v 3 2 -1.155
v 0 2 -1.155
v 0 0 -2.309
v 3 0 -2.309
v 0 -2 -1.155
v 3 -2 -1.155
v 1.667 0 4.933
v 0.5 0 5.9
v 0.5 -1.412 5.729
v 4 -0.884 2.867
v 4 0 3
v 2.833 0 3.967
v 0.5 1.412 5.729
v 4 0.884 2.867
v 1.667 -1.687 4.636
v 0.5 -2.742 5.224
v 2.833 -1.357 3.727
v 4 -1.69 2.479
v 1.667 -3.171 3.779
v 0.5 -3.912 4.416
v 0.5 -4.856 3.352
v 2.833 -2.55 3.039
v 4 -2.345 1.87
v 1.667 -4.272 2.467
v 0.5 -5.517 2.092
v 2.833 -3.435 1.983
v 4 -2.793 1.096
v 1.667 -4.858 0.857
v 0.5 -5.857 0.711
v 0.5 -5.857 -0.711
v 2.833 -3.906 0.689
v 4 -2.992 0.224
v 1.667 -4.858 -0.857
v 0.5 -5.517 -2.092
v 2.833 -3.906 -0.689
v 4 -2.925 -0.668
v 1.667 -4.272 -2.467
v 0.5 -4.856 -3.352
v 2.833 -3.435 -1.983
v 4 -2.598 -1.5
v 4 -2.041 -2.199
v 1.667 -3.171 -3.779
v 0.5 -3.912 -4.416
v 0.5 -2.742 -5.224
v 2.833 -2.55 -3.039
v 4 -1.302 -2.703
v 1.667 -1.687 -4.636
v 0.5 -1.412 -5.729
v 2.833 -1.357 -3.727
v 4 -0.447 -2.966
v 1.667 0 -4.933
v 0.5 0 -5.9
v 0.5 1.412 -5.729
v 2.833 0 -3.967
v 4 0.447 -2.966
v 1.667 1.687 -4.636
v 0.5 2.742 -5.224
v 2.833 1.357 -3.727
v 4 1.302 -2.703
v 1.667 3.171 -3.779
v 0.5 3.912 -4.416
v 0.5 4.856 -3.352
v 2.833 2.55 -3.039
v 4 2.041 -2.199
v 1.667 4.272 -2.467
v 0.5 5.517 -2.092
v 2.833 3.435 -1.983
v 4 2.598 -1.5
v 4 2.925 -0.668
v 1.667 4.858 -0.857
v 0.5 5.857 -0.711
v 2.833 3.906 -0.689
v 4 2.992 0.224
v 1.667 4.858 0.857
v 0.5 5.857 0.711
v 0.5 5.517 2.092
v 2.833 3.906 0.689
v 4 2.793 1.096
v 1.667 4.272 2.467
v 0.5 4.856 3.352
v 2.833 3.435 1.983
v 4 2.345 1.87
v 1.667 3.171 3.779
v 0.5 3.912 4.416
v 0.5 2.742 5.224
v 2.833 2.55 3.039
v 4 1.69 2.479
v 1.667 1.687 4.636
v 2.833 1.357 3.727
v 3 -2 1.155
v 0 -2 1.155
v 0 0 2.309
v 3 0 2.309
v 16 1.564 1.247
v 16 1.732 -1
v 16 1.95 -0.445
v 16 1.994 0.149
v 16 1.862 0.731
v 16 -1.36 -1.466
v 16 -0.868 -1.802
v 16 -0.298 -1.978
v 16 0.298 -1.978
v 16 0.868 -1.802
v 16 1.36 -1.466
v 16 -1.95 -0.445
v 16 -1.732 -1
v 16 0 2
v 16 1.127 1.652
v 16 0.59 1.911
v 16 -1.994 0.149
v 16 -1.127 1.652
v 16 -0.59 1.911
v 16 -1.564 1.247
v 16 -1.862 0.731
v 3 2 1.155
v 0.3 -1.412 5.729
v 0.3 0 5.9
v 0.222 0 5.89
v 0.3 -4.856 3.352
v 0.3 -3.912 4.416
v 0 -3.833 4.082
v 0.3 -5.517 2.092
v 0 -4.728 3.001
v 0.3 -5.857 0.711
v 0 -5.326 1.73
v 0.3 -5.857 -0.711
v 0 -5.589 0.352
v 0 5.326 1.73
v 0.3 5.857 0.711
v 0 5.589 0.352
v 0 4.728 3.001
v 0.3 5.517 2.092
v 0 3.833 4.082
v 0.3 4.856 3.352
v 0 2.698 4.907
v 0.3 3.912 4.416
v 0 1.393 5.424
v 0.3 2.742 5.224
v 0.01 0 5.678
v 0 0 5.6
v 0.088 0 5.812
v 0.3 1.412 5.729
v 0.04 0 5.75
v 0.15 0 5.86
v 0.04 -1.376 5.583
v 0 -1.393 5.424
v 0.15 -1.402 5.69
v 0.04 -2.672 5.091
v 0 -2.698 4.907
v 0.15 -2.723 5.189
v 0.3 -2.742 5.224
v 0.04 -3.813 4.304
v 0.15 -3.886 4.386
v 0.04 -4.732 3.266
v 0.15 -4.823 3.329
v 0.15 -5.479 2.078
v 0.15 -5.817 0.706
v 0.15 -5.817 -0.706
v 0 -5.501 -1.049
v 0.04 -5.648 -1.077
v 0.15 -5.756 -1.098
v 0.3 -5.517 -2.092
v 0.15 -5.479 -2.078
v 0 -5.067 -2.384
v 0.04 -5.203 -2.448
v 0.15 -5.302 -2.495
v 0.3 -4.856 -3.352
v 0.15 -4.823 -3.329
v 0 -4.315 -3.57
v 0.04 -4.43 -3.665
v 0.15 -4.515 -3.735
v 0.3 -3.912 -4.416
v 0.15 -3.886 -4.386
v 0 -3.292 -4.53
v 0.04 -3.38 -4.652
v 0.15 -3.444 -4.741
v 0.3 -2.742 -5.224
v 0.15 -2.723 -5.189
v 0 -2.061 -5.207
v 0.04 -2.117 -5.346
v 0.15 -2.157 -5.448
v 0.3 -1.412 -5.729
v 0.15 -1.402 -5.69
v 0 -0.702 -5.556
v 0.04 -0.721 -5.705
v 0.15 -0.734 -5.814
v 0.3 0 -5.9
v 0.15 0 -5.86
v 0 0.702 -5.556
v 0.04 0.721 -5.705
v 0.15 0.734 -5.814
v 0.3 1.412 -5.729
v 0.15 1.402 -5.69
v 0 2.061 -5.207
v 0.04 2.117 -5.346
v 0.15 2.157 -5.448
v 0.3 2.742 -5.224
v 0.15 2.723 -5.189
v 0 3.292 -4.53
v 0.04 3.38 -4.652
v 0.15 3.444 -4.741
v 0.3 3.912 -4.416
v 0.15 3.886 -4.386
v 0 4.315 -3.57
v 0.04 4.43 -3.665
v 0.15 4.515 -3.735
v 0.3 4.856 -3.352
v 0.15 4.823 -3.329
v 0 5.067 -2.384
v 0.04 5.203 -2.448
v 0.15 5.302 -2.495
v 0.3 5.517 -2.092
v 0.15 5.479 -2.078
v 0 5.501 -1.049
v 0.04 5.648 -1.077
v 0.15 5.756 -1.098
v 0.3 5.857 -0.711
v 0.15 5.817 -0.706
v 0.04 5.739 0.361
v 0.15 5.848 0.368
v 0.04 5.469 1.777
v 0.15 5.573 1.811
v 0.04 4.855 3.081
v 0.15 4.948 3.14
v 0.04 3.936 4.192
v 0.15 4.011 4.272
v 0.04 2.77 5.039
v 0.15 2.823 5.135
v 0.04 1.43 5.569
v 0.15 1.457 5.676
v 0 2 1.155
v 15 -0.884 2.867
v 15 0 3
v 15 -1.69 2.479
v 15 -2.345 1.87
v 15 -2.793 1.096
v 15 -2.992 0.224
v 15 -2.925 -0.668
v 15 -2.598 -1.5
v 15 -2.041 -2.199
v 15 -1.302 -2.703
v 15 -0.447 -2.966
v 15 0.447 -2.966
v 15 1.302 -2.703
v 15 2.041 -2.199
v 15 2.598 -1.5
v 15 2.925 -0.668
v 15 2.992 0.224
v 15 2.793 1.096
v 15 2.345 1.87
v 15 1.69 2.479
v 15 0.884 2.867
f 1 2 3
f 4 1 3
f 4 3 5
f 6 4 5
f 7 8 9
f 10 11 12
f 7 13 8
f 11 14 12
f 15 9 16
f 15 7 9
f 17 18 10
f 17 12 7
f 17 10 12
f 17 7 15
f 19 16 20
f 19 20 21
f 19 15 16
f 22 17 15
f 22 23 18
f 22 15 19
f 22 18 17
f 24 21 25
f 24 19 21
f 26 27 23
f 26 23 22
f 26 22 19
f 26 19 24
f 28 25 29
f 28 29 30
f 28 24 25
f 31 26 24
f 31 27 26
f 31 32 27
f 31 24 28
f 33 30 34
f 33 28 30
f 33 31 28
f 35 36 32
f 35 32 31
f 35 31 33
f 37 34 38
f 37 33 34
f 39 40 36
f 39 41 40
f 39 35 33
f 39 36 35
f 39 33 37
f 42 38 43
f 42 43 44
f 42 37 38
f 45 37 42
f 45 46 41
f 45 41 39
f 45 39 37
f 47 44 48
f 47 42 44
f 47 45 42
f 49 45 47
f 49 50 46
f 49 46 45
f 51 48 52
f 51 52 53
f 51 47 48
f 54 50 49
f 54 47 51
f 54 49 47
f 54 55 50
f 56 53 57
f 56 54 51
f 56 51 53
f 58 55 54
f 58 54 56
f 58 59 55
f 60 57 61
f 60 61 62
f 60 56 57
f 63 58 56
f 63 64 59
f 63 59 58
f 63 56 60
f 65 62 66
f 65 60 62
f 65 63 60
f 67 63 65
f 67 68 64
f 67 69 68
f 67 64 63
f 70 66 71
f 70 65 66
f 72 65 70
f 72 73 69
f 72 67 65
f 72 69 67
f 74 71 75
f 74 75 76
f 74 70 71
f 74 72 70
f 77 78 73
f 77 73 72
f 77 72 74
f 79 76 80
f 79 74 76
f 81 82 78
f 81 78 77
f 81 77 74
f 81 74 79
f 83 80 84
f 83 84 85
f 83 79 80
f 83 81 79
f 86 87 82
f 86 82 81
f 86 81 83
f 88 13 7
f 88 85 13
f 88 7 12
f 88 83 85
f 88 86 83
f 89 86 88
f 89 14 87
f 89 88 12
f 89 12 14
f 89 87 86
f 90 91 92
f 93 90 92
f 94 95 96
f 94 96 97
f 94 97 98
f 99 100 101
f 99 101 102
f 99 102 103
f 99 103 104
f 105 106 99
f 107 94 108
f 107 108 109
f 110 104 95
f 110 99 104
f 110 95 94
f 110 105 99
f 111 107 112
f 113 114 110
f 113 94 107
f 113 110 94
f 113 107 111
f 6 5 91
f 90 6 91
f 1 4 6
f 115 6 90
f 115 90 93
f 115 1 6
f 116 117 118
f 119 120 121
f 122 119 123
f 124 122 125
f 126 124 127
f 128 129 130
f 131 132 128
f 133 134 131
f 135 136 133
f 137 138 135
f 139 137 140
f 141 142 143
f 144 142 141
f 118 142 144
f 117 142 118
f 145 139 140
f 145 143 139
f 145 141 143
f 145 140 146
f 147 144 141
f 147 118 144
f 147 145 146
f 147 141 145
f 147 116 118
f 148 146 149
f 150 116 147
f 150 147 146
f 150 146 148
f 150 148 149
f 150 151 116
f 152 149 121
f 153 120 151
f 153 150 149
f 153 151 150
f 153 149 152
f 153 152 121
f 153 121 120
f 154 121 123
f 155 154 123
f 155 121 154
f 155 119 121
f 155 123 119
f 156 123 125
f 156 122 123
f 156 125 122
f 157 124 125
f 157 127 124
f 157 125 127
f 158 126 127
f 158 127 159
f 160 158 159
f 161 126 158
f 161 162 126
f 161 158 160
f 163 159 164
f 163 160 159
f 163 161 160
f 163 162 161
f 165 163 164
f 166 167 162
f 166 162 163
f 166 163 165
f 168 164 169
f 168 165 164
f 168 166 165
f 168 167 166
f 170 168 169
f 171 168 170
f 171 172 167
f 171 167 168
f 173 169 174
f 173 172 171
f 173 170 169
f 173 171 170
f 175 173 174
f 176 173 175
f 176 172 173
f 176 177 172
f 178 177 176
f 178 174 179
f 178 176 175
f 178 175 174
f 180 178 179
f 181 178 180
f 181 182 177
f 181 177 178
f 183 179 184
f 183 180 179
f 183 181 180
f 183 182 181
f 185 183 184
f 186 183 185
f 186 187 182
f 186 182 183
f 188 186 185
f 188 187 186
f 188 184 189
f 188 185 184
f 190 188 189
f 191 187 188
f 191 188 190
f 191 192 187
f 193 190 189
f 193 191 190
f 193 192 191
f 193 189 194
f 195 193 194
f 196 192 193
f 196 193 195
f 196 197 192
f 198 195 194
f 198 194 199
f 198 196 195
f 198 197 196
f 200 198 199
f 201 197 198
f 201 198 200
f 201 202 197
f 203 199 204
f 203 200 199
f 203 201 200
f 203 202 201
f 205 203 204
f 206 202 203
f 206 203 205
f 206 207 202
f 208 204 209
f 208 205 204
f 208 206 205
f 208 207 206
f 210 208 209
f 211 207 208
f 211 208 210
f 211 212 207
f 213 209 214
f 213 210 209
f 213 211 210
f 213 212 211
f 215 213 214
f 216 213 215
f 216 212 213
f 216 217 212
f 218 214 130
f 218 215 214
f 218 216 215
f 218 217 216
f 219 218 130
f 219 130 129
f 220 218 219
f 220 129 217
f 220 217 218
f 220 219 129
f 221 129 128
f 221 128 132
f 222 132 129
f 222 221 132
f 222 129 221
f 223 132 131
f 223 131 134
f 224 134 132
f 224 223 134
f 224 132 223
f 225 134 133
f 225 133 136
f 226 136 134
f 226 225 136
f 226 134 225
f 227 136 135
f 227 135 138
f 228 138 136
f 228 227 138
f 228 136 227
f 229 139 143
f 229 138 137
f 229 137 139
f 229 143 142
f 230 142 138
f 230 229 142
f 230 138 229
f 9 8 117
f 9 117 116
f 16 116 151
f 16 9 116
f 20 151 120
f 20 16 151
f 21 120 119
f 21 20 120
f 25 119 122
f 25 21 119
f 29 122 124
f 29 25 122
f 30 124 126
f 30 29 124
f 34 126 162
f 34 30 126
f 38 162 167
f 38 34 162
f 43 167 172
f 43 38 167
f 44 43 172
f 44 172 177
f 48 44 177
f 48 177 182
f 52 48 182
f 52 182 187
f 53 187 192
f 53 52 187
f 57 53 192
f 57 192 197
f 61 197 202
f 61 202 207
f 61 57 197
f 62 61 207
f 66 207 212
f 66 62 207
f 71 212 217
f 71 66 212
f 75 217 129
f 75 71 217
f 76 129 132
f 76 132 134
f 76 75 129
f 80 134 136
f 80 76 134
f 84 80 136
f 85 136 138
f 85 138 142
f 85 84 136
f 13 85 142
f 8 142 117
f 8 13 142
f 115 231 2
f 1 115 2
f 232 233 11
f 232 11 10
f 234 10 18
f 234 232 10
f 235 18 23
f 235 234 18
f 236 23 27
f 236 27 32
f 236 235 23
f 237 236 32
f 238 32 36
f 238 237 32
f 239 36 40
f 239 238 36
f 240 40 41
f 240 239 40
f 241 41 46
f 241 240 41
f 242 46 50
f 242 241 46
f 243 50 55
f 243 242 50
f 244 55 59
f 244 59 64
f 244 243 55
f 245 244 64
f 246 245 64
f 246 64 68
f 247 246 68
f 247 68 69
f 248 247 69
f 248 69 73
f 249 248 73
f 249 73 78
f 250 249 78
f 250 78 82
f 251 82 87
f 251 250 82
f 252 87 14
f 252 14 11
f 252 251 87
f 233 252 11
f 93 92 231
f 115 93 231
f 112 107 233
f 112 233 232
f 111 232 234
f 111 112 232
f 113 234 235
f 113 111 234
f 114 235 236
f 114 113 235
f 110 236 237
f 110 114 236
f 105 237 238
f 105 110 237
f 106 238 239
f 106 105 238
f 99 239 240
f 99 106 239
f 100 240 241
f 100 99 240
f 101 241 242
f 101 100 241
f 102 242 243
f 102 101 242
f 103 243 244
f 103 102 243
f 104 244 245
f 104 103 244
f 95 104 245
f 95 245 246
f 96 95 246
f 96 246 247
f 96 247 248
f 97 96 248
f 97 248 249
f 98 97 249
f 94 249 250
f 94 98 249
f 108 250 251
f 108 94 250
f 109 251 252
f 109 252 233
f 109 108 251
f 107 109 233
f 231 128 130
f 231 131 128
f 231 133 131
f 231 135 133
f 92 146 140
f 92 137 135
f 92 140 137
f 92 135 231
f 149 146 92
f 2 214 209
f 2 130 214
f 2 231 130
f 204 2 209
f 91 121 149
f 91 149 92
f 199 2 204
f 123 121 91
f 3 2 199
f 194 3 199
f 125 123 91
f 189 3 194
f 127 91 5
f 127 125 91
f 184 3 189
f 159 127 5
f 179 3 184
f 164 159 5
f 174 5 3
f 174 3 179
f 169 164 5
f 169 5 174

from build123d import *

# Parameters (mm, degrees)
CUT_EXTRUDE_1_DEPTH = 3
FILLET_1_R          = 0.3
CHAMFER_1_SIZE      = 1


with BuildPart() as part:
    # Эскиз1 → Повернуть1 (revolve)
    with BuildSketch(Plane.XY, mode=Mode.PRIVATE) as revolve_1_sk:
        Polygon((0, 0), (0, 5.9), (0.5, 5.9), (4, 3), (16, 3), (16, 0), align=None)
    revolve(revolve_1_sk.sketch.rotate(Axis((0, 0, 0), (1, 0, 0)), 90), axis=Axis((0, 0, 0), (1, 0, 0)))  # turned: the seam where the file's is

    # Эскиз2 → Вырез-Вытянуть1 (cut)
    with BuildSketch(Plane.ZY):
        Polygon((1.154700538, 2), (-1.154700538, 2), (-2.309401077, 0), (-1.154700538, -2), (1.154700538, -2), (2.309401077, 0), align=None)
    extrude(amount=-CUT_EXTRUDE_1_DEPTH, mode=Mode.SUBTRACT)

    # Скругление1
    fillet_1_edges = [part.edges().sort_by_distance(p)[0] for p in [
        (0, 0, -5.9),
    ]]
    fillet(fillet_1_edges, radius=FILLET_1_R)

    # Фаска1
    chamfer_1_edges = [part.edges().sort_by_distance(p)[0] for p in [
        (16, 0, -3),
    ]]
    chamfer(chamfer_1_edges, length=CHAMFER_1_SIZE)


solid = part.part
